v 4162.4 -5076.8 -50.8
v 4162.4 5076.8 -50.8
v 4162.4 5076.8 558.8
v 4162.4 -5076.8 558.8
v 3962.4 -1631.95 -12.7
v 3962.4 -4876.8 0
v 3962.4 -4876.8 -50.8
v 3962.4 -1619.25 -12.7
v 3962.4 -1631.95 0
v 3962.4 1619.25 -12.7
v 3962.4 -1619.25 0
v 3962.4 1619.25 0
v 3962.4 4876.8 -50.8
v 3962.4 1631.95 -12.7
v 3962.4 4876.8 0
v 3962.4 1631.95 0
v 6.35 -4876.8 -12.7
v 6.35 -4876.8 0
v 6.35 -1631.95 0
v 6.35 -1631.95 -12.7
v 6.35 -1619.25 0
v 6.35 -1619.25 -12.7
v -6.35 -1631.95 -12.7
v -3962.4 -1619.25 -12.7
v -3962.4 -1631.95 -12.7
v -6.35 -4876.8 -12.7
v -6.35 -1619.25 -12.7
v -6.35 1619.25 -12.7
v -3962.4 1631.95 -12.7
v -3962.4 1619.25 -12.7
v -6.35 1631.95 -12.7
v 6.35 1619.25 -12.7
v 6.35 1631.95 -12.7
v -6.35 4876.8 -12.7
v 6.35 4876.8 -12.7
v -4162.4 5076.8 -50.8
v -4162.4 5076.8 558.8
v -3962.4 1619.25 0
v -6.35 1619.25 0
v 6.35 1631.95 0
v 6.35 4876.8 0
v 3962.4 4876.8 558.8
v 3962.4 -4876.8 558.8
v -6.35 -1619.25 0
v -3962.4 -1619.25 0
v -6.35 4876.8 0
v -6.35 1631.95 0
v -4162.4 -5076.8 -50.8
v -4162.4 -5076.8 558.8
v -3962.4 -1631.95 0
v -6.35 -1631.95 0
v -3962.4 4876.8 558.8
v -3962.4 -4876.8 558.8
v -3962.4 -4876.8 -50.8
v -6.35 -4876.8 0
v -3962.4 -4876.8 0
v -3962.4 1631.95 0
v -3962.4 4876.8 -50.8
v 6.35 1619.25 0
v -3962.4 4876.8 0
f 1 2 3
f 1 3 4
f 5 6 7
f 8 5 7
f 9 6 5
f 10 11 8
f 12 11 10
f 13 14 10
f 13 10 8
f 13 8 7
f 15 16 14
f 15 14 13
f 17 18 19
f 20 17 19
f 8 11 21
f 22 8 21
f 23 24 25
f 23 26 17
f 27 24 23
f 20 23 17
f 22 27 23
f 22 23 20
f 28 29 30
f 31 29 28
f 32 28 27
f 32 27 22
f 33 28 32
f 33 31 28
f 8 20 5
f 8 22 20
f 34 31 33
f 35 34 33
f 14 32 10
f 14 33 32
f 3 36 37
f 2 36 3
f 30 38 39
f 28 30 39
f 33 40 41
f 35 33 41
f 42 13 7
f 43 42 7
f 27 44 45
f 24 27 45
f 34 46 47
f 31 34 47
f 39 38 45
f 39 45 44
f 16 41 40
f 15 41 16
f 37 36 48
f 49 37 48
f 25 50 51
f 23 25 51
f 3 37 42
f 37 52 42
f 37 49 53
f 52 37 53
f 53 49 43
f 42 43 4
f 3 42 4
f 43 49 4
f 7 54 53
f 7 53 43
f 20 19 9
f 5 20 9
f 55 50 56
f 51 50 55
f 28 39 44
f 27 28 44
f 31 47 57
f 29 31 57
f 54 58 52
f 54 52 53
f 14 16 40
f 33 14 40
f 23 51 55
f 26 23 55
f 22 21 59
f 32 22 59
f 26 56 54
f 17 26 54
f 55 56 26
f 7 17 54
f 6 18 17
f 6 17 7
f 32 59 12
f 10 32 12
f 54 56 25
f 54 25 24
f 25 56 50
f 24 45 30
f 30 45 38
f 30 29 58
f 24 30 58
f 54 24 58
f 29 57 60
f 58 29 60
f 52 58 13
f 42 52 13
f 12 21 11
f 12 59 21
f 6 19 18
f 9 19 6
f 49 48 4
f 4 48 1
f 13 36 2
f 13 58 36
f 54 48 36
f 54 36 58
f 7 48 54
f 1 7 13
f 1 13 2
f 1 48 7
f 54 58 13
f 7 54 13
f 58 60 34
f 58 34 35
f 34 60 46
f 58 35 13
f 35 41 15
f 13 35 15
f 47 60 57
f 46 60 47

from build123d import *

# Parameters (mm, degrees)
F0_W     = 7924.8
F0_H     = 9753.6
F1_DEPTH = 50.8
F3_DEPTH = 12.7
F4_W     = 8324.8
F4_H     = 10153.6
F4_W_2   = 7924.8
F4_H_2   = 9753.6
F5_DEPTH = 609.6


with BuildPart() as f1:
    # F0 (on Top) → F1 (new body)
    with BuildSketch(Plane.XY):
        Rectangle(F0_W, F0_H)
    extrude(amount=-F1_DEPTH)

    # F2 (on face) → F3 (cut)
    with BuildSketch(Plane.XY):
        Polygon((-3962.4, -1619.25), (-3962.4, -1631.95), (-6.35, -1631.95), (-6.35, -4876.8), (6.35, -4876.8), (6.35, -1631.95), (3962.4, -1631.95), (3962.4, -1619.25), (6.35, -1619.25), (6.35, 1619.25), (3962.4, 1619.25), (3962.4, 1631.95), (6.35, 1631.95), (6.35, 4876.8), (-6.35, 4876.8), (-6.35, 1631.95), (-3962.4, 1631.95), (-3962.4, 1619.25), (-6.35, 1619.25), (-6.35, -1619.25), align=None)
    extrude(amount=-F3_DEPTH, mode=Mode.SUBTRACT)


with BuildPart() as f5:
    # F4 (on face) → F5 (new body)
    with BuildSketch(Plane(origin=(0, 0, -50.8), x_dir=(1, 0, 0), z_dir=(0, 0, -1))):
        Rectangle(F4_W, F4_H)
        Rectangle(F4_W_2, F4_H_2, mode=Mode.SUBTRACT)
    extrude(amount=-F5_DEPTH)


solid = Compound([f1.part, f5.part])
